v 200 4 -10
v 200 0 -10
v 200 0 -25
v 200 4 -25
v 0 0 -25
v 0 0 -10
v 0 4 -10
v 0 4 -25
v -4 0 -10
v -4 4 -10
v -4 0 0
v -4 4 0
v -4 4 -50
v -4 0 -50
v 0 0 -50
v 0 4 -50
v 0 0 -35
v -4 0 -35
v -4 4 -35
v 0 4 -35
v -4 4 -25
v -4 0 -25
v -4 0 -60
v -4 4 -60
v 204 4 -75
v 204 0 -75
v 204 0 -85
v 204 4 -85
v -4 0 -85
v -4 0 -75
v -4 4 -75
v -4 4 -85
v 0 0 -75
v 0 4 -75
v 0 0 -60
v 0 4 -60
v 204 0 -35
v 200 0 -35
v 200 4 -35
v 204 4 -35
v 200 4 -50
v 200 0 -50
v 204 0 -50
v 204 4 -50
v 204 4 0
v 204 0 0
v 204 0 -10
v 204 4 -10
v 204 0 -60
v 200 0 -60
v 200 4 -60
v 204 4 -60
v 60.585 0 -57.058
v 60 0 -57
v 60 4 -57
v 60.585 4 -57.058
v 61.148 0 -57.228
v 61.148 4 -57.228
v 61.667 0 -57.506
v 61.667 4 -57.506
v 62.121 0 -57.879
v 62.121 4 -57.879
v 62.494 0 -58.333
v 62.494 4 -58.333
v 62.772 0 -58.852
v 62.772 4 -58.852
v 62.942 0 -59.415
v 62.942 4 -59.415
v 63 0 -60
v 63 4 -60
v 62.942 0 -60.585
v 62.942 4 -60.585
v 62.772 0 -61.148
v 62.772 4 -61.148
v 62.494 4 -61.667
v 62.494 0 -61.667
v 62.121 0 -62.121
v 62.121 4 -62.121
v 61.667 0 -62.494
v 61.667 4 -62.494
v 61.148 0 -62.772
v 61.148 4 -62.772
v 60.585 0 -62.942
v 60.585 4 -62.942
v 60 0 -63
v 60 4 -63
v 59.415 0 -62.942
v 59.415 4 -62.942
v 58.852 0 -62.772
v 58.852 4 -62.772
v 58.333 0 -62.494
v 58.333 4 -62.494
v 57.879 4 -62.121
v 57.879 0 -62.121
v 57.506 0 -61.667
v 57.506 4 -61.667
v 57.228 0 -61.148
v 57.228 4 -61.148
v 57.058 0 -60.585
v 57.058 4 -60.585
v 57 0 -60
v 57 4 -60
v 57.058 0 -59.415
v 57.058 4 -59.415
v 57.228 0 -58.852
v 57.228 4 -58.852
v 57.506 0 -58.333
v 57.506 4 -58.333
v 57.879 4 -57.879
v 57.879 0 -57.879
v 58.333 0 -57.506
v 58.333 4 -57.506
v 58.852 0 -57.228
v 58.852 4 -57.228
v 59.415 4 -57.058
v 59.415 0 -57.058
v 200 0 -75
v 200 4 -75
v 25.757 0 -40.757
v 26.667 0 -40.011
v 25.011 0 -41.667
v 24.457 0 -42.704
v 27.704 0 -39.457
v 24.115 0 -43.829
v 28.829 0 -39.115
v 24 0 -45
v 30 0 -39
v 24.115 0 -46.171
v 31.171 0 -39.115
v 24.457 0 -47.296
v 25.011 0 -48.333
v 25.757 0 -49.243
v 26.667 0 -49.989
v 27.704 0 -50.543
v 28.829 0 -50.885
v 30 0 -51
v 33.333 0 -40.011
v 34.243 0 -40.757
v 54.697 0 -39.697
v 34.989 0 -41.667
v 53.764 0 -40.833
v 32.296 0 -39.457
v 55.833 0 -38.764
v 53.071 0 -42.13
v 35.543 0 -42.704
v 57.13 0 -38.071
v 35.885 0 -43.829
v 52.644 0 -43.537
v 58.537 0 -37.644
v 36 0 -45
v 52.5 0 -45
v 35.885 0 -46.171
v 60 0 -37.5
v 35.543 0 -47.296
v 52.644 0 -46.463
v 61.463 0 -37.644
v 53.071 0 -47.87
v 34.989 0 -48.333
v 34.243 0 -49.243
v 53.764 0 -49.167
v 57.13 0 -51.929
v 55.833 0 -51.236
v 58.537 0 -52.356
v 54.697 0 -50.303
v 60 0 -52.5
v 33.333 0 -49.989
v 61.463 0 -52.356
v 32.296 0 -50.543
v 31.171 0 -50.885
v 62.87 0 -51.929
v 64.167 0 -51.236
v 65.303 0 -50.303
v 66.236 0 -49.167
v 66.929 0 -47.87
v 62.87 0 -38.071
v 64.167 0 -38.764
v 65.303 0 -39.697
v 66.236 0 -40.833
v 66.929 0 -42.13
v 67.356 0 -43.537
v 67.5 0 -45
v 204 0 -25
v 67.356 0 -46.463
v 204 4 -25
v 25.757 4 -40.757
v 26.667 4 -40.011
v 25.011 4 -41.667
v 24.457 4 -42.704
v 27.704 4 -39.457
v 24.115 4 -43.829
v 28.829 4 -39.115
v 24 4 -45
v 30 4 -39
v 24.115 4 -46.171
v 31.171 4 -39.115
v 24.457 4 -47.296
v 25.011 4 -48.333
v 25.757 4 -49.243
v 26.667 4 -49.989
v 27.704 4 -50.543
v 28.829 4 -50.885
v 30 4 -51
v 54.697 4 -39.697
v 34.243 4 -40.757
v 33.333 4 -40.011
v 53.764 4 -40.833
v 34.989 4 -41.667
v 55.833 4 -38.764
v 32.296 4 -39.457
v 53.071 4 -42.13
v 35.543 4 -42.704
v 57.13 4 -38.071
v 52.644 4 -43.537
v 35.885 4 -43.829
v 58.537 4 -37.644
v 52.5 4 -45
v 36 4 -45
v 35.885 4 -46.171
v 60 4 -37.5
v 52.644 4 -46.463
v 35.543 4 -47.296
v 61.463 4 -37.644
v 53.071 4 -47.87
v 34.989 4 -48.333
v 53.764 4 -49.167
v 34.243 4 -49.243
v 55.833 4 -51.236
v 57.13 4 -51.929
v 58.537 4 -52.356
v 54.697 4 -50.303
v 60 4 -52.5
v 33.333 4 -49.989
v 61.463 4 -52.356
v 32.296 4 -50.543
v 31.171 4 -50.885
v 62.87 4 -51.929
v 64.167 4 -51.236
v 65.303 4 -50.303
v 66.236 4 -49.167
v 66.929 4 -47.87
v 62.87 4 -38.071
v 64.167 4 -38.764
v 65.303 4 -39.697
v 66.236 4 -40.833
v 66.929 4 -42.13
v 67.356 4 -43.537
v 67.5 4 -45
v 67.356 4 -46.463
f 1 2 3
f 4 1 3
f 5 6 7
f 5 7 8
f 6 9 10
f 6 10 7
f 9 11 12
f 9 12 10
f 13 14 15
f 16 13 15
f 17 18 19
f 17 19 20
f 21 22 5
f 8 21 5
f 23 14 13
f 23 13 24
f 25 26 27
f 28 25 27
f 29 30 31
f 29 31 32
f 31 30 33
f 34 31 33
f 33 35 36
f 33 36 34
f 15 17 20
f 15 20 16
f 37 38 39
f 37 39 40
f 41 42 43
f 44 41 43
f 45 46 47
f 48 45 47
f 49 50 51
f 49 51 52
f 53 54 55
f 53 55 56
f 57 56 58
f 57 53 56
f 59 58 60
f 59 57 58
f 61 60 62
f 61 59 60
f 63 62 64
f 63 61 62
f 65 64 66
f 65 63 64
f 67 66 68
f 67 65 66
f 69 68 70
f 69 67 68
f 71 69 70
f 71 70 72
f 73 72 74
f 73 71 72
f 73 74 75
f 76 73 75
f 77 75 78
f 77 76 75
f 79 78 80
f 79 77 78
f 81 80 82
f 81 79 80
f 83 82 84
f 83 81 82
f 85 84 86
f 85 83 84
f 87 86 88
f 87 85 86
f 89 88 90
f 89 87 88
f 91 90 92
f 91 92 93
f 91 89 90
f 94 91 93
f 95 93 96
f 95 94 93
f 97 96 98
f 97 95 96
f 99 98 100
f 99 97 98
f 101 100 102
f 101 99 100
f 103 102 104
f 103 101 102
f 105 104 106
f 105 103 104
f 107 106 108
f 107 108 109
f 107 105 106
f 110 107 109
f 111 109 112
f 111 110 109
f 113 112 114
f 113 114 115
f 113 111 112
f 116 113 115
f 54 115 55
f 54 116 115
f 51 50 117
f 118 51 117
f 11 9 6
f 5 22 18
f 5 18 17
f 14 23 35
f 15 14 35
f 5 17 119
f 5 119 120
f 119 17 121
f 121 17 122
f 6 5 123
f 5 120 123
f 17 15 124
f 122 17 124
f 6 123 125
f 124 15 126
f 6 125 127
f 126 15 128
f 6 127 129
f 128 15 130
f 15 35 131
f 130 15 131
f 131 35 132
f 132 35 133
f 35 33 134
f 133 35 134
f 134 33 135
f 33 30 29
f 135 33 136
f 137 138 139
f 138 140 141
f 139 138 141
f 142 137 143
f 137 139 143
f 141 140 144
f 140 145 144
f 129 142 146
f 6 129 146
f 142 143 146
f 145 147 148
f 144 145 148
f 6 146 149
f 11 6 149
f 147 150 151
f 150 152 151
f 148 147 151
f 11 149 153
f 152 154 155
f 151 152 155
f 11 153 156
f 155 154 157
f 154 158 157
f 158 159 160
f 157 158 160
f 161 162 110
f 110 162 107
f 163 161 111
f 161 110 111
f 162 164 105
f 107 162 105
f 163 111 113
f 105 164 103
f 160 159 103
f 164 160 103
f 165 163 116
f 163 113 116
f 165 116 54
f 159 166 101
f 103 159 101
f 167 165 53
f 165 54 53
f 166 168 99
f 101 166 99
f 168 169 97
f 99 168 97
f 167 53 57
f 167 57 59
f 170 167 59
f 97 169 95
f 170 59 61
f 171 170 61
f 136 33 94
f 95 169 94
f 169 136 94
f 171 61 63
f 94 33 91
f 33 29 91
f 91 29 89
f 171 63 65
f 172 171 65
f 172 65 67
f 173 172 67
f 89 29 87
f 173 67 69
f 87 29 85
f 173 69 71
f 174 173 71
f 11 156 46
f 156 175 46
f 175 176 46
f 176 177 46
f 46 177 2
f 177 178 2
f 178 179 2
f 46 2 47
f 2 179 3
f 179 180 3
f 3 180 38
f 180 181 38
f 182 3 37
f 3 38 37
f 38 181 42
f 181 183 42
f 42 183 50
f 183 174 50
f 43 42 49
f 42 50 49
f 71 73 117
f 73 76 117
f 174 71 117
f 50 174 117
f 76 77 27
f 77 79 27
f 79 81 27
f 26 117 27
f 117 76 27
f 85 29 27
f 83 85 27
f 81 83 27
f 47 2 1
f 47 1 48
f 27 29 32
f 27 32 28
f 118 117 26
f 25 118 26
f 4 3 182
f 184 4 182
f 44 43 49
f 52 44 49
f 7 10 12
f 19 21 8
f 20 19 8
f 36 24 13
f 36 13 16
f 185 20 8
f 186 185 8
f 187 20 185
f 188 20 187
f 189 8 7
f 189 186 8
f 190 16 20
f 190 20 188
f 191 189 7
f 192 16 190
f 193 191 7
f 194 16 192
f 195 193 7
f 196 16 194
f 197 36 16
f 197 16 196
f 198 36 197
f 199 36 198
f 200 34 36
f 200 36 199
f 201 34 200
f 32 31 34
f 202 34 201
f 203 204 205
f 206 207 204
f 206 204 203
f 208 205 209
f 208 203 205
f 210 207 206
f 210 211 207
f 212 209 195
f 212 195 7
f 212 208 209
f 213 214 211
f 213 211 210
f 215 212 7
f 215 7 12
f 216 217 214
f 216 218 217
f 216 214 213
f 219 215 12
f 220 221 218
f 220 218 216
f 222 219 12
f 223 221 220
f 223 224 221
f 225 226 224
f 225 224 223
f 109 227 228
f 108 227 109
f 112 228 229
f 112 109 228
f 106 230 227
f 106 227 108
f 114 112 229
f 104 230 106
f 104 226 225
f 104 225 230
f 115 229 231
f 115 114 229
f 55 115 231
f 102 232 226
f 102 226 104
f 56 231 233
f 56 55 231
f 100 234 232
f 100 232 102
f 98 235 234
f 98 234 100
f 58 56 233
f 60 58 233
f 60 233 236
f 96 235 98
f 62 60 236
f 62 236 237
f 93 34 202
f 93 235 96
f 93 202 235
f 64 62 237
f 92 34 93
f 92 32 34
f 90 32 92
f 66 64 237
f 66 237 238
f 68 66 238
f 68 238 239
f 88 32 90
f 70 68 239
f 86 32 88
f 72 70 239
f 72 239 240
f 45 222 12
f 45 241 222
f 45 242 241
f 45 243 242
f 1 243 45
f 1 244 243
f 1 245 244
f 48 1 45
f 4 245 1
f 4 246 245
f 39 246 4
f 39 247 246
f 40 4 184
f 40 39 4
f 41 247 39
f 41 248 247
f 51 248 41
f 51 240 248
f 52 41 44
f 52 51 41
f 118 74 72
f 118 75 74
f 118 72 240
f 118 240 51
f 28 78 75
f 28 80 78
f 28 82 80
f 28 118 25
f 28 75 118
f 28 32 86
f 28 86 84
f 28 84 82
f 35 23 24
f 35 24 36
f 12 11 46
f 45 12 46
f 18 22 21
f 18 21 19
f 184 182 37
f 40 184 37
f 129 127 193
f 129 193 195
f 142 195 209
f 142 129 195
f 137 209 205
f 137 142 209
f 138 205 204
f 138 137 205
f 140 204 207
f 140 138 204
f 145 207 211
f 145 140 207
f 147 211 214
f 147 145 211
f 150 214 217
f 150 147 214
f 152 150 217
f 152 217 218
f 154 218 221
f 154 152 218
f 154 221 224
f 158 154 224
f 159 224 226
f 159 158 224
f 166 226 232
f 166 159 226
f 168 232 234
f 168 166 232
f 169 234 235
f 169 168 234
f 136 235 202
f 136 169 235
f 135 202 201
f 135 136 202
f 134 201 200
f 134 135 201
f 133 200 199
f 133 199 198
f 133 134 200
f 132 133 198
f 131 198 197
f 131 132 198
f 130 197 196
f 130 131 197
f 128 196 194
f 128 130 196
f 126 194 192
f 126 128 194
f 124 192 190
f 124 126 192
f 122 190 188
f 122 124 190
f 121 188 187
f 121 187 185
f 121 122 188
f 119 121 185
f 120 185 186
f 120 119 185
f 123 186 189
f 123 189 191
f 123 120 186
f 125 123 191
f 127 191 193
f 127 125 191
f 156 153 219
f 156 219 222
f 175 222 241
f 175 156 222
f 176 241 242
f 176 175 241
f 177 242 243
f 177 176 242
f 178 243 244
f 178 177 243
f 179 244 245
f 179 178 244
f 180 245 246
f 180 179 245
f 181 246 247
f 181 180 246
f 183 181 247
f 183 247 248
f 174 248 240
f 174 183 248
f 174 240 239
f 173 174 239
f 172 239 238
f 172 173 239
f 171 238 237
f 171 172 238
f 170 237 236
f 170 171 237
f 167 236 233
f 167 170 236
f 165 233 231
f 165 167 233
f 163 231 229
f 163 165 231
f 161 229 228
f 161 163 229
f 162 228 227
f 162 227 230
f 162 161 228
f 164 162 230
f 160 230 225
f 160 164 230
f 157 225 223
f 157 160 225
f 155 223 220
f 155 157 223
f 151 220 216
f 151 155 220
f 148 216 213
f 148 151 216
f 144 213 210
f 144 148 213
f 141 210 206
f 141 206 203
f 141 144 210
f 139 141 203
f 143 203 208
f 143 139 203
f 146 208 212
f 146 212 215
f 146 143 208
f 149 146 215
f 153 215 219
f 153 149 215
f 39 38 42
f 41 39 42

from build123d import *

# Parameters (mm, degrees)
SKETCH1_W           = 4
SKETCH1_H           = 10
SKETCH1_W_2         = 200
SKETCH1_H_2         = 85
SKETCH1_R           = 3
SKETCH1_R_2         = 7.5
SKETCH1_R_3         = 6
BOSS_EXTRUDE4_DEPTH = 4


with BuildPart() as part:
    # Sketch1 → Boss-Extrude4 (new body)
    # profile 1 of 9: a face of its own
    with BuildSketch(Plane(origin=(0, 0, 0), x_dir=(1, 0, 0), z_dir=(0, 1, 0))):
        with Locations((-2, 80)):
            Rectangle(SKETCH1_W, SKETCH1_H)
    # profile 2 of 9: a face of its own
    with BuildSketch(Plane(origin=(0, 0, 0), x_dir=(1, 0, 0), z_dir=(0, 1, 0))):
        with Locations((-2, 55)):
            Rectangle(SKETCH1_W, SKETCH1_H)
    # profile 3 of 9: a face of its own
    with BuildSketch(Plane(origin=(0, 0, 0), x_dir=(1, 0, 0), z_dir=(0, 1, 0))):
        with Locations((-2, 30)):
            Rectangle(SKETCH1_W, SKETCH1_H)
    # profile 4 of 9: a face of its own
    with BuildSketch(Plane(origin=(0, 0, 0), x_dir=(1, 0, 0), z_dir=(0, 1, 0))):
        with Locations((-2, 5)):
            Rectangle(SKETCH1_W, SKETCH1_H)
    # profile 5 of 9: a face of its own
    with BuildSketch(Plane(origin=(0, 0, 0), x_dir=(1, 0, 0), z_dir=(0, 1, 0))):
        with Locations((202, 5)):
            Rectangle(SKETCH1_W, SKETCH1_H)
    # profile 6 of 9: a face of its own
    with BuildSketch(Plane(origin=(0, 0, 0), x_dir=(1, 0, 0), z_dir=(0, 1, 0))):
        with Locations((202, 30)):
            Rectangle(SKETCH1_W, SKETCH1_H)
    # profile 7 of 9: a face of its own
    with BuildSketch(Plane(origin=(0, 0, 0), x_dir=(1, 0, 0), z_dir=(0, 1, 0))):
        with Locations((202, 55)):
            Rectangle(SKETCH1_W, SKETCH1_H)
    # profile 8 of 9: a face of its own
    with BuildSketch(Plane(origin=(0, 0, 0), x_dir=(1, 0, 0), z_dir=(0, 1, 0))):
        with Locations((202, 80)):
            Rectangle(SKETCH1_W, SKETCH1_H)
    # profile 9 of 9: a face of its own
    with BuildSketch(Plane(origin=(0, 0, 0), x_dir=(1, 0, 0), z_dir=(0, 1, 0))):
        with Locations((100, 42.5)):
            Rectangle(SKETCH1_W_2, SKETCH1_H_2)
        with Locations(Location((60, 60, 0), (0, 0, 270))):
            Circle(SKETCH1_R, mode=Mode.SUBTRACT)
        with Locations(Location((60, 45, 0), (0, 0, 270))):
            Circle(SKETCH1_R_2, mode=Mode.SUBTRACT)
        with Locations(Location((30, 45, 0), (0, 0, 270))):
            Circle(SKETCH1_R_3, mode=Mode.SUBTRACT)
    extrude(amount=BOSS_EXTRUDE4_DEPTH)


solid = part.part
